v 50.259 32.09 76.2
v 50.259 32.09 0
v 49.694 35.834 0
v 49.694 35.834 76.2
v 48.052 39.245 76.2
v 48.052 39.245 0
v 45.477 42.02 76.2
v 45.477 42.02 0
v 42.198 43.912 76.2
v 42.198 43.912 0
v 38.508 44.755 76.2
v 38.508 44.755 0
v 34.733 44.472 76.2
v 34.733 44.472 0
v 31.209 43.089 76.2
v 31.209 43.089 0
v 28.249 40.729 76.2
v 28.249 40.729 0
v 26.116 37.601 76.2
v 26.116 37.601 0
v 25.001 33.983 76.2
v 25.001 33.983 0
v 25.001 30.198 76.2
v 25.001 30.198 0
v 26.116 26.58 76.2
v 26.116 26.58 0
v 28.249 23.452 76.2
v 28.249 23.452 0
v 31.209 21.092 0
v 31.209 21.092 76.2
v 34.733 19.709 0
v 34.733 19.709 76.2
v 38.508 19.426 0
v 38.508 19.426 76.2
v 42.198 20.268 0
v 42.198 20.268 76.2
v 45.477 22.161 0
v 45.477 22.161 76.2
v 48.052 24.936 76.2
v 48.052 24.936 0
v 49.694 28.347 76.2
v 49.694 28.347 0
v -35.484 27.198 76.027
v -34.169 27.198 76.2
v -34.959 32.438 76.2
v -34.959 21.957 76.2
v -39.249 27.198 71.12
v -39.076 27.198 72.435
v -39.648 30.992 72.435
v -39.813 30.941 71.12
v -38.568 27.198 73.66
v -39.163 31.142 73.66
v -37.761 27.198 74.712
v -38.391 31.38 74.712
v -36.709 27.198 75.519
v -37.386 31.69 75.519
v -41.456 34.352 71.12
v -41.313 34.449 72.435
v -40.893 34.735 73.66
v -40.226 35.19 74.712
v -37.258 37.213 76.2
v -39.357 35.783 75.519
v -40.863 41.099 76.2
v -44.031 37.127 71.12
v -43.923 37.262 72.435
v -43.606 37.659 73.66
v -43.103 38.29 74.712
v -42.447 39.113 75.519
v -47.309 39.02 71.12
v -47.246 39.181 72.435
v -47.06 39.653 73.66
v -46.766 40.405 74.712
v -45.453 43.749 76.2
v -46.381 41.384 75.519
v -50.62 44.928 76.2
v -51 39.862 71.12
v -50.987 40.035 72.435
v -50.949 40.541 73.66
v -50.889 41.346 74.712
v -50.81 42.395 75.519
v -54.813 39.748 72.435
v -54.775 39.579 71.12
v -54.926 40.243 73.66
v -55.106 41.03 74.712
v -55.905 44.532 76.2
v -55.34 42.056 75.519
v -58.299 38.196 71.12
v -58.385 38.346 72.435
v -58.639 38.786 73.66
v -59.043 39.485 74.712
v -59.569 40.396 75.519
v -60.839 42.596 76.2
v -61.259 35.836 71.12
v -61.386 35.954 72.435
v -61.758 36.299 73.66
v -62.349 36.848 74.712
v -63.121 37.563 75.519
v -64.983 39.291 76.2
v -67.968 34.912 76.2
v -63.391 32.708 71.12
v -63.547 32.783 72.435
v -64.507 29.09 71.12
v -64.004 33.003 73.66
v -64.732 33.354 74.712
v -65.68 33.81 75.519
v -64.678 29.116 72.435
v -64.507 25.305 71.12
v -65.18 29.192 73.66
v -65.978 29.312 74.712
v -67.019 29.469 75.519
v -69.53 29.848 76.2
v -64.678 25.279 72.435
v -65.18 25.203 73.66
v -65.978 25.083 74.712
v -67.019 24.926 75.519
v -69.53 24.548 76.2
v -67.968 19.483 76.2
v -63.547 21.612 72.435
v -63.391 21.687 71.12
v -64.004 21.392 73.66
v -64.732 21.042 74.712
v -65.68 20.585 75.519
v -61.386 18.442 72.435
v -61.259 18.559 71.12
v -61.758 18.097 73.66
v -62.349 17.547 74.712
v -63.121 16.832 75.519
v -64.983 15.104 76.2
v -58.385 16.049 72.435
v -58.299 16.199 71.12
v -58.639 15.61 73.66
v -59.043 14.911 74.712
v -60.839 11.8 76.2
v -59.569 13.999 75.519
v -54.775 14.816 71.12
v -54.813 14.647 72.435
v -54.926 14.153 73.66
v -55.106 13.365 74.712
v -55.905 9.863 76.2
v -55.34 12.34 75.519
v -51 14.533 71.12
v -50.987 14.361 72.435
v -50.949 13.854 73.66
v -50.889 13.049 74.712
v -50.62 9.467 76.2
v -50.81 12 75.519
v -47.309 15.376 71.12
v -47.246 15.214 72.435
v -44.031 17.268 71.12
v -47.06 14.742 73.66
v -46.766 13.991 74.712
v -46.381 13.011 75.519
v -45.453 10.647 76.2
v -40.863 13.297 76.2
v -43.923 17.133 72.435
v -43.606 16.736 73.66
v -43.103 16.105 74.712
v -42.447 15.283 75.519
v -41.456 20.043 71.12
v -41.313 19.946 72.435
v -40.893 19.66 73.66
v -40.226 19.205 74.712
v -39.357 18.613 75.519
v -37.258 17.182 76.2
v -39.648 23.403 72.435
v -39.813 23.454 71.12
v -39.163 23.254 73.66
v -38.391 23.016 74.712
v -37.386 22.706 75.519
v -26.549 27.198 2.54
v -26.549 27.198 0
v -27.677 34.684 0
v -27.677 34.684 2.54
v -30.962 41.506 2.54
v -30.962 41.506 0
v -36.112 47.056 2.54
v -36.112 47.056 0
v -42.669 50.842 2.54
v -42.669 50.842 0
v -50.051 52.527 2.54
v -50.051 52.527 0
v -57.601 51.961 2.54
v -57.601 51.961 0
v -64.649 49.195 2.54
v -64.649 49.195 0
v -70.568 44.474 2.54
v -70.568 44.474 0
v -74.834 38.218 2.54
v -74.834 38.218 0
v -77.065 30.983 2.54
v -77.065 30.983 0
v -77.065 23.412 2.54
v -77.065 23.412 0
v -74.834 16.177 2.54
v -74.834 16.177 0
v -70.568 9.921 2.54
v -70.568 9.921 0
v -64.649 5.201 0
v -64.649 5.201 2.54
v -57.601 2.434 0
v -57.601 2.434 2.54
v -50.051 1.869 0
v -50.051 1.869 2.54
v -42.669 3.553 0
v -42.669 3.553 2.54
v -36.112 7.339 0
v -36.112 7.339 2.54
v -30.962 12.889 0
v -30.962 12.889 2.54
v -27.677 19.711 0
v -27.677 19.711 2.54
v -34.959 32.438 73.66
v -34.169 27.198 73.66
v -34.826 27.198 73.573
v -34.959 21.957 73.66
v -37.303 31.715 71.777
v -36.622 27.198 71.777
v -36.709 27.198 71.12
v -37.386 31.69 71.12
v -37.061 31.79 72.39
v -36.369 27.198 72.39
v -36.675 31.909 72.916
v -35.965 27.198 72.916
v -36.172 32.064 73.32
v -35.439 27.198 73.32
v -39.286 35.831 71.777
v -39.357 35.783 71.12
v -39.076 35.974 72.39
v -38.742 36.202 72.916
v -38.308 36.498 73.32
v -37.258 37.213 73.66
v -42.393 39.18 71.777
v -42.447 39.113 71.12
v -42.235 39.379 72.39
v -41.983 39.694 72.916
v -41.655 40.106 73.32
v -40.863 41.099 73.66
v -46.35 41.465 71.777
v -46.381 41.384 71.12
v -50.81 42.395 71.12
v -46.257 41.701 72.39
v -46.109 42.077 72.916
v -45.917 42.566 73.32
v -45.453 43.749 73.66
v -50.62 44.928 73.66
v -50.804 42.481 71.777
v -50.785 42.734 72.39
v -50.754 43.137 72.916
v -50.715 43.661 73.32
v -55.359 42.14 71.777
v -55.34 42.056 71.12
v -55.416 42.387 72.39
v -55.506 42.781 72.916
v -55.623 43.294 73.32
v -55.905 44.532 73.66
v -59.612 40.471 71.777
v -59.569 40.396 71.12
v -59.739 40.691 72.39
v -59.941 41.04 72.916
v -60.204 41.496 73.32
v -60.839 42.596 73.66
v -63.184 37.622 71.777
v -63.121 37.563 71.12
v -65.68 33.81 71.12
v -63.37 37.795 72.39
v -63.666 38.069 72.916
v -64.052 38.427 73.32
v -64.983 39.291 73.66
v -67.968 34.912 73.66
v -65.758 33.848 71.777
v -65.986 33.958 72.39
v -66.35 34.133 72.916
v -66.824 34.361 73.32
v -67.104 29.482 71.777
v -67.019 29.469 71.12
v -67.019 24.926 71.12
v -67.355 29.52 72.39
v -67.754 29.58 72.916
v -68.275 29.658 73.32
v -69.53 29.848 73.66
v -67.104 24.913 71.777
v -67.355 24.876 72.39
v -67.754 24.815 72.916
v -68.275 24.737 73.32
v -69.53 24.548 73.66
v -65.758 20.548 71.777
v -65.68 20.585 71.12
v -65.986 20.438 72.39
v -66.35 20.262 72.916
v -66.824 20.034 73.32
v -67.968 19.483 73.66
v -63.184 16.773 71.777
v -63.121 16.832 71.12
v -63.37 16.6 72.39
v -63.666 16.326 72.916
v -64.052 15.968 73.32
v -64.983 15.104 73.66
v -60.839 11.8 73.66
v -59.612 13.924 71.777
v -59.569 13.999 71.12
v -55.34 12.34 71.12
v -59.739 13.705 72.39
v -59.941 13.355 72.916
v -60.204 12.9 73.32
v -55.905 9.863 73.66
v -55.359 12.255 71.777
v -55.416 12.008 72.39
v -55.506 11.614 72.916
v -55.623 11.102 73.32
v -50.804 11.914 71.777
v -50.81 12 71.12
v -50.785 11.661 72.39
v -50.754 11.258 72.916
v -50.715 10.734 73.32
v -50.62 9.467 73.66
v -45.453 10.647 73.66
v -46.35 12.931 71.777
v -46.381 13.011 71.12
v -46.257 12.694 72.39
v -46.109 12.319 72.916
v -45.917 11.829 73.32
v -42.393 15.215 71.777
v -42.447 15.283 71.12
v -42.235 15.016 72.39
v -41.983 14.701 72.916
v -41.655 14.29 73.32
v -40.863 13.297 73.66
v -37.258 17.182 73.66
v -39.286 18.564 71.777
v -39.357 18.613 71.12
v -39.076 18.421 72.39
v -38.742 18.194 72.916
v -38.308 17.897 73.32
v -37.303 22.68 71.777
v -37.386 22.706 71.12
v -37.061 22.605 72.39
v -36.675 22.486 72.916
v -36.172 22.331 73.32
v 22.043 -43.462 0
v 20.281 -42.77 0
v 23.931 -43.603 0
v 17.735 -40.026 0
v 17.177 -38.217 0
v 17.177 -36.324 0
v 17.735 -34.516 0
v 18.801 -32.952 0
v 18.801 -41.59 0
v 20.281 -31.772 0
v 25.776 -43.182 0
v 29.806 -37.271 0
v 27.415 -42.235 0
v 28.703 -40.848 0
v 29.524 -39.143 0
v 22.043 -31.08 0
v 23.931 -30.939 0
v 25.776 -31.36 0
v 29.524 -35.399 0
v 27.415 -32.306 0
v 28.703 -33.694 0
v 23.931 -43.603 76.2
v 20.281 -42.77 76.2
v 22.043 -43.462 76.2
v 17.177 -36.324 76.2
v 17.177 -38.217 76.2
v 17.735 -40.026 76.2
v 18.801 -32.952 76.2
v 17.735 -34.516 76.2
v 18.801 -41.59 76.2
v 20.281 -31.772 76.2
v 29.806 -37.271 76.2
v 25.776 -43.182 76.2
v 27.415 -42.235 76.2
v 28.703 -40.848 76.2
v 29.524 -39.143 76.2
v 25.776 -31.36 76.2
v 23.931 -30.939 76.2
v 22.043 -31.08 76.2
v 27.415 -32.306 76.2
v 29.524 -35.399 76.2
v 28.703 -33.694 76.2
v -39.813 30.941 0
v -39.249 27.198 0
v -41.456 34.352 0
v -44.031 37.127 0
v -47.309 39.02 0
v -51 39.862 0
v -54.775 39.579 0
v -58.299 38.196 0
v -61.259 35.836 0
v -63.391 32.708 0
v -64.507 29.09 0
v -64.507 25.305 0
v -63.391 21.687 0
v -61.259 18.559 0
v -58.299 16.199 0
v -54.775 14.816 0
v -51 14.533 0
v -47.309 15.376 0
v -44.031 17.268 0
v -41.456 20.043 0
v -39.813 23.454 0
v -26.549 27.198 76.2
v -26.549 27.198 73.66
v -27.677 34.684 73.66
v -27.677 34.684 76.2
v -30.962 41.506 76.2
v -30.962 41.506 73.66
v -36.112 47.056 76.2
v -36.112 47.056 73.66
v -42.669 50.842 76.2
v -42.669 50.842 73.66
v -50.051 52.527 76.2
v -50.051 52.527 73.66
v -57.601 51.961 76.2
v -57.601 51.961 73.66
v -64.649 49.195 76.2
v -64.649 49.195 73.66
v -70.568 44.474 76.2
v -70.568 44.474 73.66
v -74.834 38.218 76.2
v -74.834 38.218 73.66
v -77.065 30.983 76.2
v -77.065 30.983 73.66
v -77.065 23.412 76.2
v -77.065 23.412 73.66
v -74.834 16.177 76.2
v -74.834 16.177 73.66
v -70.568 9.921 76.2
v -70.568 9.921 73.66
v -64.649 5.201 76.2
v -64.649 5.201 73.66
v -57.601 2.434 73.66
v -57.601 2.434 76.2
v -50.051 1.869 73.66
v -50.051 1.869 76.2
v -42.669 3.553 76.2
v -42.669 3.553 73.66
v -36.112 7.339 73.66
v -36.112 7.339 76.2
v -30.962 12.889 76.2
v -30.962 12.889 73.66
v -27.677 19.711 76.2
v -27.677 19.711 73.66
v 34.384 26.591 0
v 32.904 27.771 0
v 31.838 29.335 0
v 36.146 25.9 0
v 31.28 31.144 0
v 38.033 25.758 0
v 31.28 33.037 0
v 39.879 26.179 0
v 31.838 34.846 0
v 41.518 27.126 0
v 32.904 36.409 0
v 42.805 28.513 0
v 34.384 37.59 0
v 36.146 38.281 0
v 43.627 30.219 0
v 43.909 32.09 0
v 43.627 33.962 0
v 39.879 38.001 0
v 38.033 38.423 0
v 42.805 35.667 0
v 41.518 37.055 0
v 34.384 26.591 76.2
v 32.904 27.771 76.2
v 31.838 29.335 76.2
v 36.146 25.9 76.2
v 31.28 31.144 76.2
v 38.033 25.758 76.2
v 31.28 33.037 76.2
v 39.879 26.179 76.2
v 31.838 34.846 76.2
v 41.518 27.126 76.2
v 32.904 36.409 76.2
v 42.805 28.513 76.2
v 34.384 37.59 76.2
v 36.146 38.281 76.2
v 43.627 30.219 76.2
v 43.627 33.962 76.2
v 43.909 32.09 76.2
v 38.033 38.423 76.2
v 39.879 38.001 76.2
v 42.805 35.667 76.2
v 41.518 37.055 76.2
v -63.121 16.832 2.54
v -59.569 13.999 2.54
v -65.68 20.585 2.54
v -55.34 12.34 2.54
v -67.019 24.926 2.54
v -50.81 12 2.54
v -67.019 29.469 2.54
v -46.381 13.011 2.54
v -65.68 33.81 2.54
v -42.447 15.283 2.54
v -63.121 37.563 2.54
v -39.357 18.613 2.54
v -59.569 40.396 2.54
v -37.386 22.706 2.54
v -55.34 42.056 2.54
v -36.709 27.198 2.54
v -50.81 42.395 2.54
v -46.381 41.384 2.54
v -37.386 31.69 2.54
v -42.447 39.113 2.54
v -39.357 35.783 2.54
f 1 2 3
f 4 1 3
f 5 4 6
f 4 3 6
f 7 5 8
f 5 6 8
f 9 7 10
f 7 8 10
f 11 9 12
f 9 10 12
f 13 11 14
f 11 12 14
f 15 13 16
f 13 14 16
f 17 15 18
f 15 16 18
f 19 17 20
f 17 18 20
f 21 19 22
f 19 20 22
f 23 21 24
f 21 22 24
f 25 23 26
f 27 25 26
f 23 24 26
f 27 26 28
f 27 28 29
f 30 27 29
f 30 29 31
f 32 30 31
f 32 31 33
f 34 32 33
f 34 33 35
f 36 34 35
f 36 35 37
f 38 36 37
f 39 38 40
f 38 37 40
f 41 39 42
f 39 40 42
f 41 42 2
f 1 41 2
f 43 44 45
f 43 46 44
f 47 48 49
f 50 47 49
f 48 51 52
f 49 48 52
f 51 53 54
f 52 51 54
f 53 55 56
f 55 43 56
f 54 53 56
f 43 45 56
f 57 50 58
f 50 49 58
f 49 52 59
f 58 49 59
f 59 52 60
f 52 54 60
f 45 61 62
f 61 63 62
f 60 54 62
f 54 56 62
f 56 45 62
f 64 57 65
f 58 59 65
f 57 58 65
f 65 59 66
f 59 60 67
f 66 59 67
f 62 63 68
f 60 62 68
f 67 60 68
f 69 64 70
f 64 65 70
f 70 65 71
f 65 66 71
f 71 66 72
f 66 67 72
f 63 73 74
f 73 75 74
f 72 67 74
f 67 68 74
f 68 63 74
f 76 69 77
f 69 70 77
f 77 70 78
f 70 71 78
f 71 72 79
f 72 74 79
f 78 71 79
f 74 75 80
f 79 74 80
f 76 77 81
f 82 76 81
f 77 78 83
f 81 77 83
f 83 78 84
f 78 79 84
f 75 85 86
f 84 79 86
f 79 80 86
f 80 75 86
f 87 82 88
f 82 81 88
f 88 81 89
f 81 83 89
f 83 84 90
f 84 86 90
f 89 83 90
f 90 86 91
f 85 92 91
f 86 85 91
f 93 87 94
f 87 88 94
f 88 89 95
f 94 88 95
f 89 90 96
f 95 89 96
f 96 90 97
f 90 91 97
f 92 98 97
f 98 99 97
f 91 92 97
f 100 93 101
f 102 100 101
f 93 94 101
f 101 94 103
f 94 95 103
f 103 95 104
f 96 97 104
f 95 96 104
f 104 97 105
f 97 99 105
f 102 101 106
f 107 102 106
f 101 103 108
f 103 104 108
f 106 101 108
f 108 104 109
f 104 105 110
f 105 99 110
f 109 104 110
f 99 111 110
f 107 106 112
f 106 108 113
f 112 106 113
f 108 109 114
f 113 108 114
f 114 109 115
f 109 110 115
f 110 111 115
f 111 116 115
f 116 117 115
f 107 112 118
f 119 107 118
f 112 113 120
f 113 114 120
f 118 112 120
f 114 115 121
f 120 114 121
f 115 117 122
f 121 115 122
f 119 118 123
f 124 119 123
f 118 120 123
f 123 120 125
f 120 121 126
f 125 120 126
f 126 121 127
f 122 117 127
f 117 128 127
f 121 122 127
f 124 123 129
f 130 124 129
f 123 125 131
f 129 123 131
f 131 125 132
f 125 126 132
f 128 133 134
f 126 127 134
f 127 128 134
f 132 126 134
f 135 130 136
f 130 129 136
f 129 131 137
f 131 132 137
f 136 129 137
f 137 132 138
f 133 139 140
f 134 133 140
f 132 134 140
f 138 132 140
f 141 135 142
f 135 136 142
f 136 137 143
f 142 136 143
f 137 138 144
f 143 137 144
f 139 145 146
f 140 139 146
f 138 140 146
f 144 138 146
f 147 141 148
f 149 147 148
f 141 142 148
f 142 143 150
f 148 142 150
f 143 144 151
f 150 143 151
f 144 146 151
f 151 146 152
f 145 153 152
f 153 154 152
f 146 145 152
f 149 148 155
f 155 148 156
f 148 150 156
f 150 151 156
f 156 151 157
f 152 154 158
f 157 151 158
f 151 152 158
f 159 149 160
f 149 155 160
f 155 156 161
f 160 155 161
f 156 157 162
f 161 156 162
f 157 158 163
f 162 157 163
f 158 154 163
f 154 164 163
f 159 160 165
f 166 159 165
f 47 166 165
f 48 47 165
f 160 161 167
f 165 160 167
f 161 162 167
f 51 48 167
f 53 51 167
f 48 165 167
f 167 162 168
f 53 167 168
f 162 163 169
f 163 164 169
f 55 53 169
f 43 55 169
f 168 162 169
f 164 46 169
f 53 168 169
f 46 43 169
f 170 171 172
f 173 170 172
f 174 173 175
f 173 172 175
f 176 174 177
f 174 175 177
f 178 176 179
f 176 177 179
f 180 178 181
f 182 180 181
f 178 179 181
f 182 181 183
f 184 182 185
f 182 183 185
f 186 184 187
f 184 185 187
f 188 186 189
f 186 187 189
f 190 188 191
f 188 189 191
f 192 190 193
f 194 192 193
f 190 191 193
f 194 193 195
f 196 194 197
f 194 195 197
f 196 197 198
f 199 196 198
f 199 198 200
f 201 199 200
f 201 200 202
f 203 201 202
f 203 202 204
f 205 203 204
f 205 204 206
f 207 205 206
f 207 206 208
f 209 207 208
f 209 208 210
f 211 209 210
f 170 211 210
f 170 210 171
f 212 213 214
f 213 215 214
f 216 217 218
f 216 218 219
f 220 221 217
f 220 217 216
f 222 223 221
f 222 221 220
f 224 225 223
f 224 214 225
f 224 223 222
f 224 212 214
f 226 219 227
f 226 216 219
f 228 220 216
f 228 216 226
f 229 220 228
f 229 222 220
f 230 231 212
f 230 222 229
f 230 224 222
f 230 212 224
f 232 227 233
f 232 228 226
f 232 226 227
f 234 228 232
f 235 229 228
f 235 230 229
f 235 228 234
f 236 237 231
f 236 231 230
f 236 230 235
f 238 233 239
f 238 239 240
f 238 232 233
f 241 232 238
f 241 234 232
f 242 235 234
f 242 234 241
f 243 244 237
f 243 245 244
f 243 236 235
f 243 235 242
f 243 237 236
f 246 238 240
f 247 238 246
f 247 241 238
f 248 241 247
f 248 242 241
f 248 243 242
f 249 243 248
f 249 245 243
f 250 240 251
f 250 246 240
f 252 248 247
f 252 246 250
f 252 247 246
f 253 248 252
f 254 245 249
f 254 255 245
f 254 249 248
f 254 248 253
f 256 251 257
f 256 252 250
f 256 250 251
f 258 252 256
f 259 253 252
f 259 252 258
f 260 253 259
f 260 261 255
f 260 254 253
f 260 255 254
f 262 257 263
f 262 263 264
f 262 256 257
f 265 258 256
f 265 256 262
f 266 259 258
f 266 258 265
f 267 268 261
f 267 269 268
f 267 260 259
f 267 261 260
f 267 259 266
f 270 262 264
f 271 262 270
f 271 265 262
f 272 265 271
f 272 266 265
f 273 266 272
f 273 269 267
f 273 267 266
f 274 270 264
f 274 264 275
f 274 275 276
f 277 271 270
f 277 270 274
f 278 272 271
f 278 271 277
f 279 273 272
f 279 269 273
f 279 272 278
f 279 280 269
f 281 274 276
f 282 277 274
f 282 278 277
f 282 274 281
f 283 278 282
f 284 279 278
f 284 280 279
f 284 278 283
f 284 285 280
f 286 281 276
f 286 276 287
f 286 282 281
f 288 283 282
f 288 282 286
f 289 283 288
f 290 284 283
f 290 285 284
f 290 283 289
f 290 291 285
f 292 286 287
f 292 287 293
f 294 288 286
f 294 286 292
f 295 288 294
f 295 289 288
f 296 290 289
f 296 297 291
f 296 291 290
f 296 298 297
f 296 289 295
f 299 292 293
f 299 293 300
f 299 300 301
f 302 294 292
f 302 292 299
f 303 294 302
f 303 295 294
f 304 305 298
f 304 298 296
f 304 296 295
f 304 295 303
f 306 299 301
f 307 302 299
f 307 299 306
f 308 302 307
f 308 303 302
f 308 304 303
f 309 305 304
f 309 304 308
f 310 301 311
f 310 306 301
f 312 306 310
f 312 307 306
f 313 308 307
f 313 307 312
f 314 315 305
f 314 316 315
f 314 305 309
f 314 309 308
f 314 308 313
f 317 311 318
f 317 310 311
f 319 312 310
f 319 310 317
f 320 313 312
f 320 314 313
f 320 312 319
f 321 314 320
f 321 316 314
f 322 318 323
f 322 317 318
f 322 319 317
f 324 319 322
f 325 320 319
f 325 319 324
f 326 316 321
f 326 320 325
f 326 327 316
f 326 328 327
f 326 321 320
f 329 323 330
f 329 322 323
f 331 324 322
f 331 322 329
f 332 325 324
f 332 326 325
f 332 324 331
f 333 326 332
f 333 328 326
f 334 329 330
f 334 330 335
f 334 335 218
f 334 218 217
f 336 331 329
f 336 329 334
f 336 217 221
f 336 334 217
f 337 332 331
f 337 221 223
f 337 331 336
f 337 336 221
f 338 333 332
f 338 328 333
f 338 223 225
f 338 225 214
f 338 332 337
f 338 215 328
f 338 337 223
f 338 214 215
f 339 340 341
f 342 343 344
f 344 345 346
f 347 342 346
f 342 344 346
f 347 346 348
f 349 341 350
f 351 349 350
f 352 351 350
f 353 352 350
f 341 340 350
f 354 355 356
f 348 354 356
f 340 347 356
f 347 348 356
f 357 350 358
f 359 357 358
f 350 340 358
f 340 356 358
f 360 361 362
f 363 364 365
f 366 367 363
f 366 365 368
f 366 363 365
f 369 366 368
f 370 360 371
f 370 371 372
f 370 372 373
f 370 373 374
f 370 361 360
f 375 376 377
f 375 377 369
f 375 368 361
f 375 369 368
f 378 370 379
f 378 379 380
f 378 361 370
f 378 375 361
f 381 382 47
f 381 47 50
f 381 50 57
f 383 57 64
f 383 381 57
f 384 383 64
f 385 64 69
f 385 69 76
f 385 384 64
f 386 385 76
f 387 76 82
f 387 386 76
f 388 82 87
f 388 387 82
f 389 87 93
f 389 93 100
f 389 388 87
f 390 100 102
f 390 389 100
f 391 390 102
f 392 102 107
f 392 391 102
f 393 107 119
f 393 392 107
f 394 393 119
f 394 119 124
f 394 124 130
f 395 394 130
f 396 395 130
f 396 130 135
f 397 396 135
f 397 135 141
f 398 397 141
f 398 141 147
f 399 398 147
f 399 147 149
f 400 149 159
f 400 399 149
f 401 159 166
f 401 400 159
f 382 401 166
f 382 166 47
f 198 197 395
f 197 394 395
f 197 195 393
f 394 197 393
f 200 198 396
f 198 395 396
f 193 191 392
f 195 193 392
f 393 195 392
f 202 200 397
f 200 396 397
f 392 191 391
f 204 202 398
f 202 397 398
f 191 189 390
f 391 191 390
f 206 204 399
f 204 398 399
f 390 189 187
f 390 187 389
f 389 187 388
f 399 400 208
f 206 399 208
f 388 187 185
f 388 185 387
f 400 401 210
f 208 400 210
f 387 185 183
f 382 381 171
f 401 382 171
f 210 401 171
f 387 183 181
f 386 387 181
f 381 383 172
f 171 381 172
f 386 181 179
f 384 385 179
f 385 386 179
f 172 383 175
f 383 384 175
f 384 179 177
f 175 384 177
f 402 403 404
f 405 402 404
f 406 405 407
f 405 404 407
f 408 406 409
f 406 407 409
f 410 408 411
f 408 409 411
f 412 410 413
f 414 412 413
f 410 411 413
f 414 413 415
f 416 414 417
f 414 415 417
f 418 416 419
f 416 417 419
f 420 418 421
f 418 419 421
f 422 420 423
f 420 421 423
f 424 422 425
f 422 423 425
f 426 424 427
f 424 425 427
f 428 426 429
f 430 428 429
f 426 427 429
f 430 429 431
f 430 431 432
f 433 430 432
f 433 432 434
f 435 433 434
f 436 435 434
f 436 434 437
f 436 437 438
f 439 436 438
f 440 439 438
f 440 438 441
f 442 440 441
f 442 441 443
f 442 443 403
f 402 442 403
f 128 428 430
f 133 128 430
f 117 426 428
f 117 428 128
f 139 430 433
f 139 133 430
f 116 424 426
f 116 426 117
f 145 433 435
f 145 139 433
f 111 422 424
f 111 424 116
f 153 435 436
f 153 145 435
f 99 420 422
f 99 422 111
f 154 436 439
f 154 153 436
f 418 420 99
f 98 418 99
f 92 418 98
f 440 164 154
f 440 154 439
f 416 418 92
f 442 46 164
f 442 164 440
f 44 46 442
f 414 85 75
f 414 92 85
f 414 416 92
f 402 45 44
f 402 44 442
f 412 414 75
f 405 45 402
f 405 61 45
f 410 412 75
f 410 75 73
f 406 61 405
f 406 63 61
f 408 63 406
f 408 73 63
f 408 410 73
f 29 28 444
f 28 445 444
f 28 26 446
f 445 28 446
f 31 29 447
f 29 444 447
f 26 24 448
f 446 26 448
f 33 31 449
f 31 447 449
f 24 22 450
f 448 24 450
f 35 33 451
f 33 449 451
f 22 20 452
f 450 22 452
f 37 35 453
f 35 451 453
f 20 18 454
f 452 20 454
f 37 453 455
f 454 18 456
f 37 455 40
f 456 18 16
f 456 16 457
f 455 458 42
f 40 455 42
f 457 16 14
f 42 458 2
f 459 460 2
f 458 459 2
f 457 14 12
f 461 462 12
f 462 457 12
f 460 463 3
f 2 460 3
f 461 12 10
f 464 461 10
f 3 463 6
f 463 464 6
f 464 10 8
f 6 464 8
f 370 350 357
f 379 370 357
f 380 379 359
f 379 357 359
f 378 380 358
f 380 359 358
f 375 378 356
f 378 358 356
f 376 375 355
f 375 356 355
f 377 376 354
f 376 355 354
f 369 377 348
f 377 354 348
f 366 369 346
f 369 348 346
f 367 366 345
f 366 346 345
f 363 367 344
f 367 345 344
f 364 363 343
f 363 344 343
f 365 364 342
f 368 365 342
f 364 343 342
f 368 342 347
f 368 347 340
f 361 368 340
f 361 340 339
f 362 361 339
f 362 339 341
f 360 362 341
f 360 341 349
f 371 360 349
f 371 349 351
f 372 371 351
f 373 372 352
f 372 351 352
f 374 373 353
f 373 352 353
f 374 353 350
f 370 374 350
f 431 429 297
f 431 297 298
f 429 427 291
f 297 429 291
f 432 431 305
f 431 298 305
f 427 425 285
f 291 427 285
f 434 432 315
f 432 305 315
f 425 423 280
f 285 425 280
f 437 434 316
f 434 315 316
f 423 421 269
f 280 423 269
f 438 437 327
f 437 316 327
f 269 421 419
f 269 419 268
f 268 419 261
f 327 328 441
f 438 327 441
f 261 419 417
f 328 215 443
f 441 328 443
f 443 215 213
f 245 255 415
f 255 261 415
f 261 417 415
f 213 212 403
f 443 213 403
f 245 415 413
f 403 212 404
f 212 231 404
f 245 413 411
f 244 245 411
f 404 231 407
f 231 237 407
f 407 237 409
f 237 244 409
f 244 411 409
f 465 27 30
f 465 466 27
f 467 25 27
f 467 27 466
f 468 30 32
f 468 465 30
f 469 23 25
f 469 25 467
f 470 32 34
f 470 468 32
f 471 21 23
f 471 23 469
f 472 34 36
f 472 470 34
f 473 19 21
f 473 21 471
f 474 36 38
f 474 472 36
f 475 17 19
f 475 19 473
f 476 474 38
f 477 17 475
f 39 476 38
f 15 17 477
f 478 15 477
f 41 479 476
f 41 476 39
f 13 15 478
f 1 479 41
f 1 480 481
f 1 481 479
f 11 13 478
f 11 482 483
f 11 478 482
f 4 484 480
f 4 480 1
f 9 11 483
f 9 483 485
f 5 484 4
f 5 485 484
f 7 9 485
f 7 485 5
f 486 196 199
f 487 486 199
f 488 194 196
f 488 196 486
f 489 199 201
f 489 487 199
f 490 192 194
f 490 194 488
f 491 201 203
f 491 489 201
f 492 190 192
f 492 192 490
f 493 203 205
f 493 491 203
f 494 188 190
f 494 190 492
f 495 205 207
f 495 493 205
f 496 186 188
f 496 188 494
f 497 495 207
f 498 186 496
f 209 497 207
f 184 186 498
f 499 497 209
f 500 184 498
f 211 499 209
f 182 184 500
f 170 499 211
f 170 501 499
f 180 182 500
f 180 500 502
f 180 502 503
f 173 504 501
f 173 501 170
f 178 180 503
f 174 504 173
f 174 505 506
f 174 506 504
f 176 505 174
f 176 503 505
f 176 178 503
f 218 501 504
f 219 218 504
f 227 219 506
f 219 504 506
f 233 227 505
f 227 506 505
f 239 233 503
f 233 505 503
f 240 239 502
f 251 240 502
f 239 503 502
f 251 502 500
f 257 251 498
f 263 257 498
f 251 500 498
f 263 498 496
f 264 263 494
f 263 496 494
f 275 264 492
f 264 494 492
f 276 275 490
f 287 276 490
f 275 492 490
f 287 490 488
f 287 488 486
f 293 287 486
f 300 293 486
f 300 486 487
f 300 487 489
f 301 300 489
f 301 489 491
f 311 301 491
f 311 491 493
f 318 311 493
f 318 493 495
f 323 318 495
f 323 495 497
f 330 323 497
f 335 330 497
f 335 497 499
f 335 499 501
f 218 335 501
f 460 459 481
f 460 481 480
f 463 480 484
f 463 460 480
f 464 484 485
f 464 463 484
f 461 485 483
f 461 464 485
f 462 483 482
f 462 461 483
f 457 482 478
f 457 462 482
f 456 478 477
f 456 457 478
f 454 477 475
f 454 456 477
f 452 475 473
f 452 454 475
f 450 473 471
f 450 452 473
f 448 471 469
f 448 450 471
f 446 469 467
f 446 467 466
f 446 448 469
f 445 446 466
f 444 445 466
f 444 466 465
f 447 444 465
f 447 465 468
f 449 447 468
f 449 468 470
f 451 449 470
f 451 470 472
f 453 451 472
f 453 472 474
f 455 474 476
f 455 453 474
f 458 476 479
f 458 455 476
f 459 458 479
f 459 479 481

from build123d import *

# Parameters (mm, degrees)
F0_R     = 25.4
F0_R_2   = 12.7
F1_DEPTH = 76.2
F0_R_3   = 6.35
F2_R     = 5.08
F3_T     = -2.54


with BuildPart() as f1:
    # F0 (on Top) → F1 (new body)
    with BuildSketch(Plane.XY):
        with Locations((-51.9489385188, 27.1976441145)):
            Circle(F0_R)
        with Locations((-51.9489385188, 27.1976441145)):
            Circle(F0_R_2, mode=Mode.SUBTRACT)
    extrude(amount=F1_DEPTH)

    # F2
    f2_edges = [f1.edges().sort_by_distance(p)[0] for p in [
        (-64.648939, 27.197644, 76.2),
    ]]
    fillet(f2_edges, radius=F2_R)

    # F3
    f3_openings = [f1.faces().sort_by_distance(p)[0] for p in [
        (-77.348939, 27.197644, 38.1),
    ]]
    offset(amount=F3_T, openings=f3_openings)


with BuildPart() as f1b:
    # F0 (on Top) → F1, piece 2 (new body)
    with BuildSketch(Plane.XY):
        with Locations((37.5586524606, 32.0903435349)):
            Circle(F0_R_2)
        with Locations((37.5586524606, 32.0903435349)):
            Circle(F0_R_3, mode=Mode.SUBTRACT)
    extrude(amount=F1_DEPTH)


with BuildPart() as f1c:
    # F0 (on Top) → F1, piece 3 (new body)
    with BuildSketch(Plane.XY):
        with Locations((23.4561674297, -37.270847708)):
            Circle(F0_R_3)
    extrude(amount=F1_DEPTH)


solid = Compound([f1.part, f1b.part, f1c.part])
